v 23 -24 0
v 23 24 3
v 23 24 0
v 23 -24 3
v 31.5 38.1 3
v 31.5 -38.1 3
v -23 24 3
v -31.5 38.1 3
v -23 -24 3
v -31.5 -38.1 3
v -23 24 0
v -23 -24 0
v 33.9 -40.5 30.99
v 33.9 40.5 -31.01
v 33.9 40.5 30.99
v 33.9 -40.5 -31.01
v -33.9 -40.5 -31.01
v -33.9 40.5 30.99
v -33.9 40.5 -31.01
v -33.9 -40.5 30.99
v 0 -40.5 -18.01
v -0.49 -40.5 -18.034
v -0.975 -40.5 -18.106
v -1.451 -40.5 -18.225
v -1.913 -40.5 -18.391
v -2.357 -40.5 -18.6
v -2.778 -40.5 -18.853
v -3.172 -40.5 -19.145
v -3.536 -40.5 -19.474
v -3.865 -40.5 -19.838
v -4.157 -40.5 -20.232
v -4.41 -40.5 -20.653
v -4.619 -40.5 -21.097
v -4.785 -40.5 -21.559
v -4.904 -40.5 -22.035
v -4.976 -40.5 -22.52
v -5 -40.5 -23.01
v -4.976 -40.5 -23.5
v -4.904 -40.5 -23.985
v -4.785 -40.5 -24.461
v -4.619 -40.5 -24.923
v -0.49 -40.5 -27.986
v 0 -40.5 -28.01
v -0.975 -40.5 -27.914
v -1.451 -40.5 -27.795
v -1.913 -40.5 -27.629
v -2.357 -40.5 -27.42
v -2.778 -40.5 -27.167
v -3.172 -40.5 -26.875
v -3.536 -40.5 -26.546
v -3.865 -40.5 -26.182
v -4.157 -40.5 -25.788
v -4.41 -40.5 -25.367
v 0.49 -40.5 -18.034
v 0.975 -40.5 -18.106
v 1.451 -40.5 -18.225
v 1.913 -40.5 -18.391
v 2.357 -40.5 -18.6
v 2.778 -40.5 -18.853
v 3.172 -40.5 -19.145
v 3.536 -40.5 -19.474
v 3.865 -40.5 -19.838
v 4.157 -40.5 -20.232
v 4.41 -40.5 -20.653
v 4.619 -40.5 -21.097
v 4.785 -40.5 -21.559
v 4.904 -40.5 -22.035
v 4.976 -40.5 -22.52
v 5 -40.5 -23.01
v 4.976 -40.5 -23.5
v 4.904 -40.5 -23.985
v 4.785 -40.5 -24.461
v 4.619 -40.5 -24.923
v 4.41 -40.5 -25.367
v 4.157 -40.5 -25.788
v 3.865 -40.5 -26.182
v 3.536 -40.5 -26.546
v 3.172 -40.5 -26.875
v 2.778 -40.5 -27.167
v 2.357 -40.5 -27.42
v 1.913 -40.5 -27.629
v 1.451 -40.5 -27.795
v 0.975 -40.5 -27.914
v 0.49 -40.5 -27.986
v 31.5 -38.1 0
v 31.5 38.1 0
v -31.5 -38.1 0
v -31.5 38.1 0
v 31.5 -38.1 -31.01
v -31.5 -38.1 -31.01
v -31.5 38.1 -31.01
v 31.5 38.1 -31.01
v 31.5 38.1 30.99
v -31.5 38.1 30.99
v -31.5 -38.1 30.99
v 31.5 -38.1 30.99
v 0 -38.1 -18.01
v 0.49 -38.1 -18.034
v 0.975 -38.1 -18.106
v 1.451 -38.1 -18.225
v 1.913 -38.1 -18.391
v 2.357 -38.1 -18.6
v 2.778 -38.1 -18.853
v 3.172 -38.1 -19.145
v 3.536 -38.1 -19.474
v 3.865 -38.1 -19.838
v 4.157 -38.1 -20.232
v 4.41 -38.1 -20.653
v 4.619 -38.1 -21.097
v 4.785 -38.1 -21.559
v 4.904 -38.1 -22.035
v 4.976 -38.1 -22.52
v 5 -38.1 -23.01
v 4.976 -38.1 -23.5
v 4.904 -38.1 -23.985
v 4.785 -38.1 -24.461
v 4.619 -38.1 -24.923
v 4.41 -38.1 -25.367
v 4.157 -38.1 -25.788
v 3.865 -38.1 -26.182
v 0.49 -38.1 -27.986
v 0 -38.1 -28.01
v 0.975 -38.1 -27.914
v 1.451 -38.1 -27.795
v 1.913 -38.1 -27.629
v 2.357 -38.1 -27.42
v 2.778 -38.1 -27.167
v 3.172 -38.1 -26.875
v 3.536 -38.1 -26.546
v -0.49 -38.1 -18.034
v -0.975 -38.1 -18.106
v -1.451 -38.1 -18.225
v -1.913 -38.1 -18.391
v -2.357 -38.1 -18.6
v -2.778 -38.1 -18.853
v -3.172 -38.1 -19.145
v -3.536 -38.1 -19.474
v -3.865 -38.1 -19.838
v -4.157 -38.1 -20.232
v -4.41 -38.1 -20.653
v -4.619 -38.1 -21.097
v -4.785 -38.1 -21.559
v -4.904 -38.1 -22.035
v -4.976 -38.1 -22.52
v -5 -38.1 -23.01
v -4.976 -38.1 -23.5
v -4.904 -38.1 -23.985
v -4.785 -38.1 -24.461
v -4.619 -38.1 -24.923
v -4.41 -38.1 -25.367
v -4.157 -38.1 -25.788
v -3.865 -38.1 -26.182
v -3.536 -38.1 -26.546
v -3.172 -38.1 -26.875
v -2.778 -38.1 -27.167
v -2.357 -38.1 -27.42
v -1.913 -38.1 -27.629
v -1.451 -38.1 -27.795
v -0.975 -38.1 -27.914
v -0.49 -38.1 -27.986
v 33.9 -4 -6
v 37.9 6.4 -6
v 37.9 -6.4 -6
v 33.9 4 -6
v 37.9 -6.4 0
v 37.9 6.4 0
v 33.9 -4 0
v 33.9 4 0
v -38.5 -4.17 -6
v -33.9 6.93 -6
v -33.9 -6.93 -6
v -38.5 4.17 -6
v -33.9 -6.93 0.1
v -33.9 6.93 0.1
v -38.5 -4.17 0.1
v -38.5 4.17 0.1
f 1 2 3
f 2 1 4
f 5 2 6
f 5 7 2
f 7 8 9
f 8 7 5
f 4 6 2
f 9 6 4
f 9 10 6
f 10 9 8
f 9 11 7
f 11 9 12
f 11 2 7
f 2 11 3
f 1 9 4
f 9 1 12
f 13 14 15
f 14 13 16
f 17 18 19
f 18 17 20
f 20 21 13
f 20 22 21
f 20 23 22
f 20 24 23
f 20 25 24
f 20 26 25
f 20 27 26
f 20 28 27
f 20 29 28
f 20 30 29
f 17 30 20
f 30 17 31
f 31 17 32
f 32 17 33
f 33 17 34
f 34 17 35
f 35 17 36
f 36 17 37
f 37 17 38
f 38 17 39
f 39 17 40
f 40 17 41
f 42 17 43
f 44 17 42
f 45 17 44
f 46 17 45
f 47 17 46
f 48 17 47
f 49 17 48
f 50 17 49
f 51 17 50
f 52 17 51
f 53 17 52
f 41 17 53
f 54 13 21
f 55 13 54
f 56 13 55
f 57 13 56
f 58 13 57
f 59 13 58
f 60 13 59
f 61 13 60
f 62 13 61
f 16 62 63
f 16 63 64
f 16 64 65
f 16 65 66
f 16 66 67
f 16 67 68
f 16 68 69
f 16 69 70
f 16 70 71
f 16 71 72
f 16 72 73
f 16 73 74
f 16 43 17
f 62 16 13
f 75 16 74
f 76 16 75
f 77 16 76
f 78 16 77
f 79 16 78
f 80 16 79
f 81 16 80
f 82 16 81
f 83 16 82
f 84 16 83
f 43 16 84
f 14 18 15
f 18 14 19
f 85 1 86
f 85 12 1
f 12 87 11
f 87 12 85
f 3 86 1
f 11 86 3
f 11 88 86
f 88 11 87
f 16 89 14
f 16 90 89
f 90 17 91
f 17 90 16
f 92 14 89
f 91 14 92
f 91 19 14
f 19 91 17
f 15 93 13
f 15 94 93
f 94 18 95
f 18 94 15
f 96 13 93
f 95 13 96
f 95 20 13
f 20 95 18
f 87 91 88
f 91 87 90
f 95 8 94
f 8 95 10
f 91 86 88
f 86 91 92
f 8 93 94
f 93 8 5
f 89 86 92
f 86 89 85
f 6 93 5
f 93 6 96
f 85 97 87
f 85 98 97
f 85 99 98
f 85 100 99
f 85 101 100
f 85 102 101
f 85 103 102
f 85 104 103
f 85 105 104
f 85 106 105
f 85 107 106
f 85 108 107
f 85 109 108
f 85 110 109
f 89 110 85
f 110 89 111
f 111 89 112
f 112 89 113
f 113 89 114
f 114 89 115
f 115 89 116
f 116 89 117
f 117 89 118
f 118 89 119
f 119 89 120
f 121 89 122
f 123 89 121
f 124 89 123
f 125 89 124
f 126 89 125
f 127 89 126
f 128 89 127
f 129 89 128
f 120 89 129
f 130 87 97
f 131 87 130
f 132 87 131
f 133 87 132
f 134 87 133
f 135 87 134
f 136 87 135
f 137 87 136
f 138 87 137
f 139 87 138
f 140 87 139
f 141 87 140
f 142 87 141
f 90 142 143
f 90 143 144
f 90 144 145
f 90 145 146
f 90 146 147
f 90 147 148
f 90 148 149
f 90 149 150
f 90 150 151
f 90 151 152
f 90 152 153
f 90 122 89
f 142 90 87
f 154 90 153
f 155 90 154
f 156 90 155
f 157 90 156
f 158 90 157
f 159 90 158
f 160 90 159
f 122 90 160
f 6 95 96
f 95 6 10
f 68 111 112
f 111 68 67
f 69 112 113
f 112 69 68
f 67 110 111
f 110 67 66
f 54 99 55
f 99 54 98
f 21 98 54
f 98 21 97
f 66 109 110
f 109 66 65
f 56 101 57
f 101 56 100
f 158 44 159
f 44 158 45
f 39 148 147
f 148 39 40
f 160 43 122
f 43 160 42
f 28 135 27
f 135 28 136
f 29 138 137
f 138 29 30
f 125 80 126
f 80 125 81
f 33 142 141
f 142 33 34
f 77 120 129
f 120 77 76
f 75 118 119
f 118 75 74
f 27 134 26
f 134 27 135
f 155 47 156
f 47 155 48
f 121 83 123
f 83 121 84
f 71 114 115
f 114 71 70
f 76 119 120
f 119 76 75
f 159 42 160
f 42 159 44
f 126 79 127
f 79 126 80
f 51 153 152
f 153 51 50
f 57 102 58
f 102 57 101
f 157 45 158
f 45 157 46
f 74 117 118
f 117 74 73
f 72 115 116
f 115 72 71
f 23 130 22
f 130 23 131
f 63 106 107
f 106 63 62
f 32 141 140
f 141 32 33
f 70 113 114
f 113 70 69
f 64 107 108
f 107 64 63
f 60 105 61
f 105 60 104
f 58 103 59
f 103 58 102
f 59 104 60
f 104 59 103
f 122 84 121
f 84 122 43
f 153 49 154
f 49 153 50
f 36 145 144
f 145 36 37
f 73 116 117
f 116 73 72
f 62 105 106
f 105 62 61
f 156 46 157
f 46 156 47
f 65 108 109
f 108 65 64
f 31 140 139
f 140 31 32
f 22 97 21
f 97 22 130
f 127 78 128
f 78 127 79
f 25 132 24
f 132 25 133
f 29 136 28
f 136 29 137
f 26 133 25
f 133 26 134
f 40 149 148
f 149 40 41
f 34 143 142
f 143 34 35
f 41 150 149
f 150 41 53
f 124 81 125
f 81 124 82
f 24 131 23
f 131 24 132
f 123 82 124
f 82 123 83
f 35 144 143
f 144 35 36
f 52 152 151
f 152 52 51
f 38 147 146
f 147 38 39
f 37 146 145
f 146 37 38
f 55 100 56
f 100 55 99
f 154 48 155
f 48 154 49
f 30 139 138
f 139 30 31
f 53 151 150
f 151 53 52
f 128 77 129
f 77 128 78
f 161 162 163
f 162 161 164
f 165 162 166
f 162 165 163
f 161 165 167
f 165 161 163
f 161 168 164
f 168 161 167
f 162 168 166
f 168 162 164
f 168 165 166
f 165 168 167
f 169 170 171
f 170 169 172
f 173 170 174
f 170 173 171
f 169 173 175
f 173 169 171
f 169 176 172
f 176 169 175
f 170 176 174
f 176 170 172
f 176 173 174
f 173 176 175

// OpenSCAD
// file: params.scad
// ============================================================
// params.scad — every tunable dimension for the split-flap build.
// Units: millimetres. Import this from module.scad / enclosure.scad.
//
// The three numbers you actually tune for YOUR printer are the
// *_CLEARANCE values near the bottom. Everything else is geometry.
// ============================================================

// ---- character / flap geometry ----
FLAP_COUNT      = 48;      // flaps on the drum (matches charset.json)
FLAP_W          = 42;      // printed flap width  (visible glyph area a touch narrower)
FLAP_H          = 46;      // printed flap height (top+bottom halves together)
FLAP_T          = 0.6;     // flap material thickness (0.5mm PET / sticker card)
FLAP_PIN_D      = 1.8;     // diameter of the two side pins that ride the drum slots
FLAP_PIN_L      = 2.2;     // how far each pin sticks out per side

// ---- drum (the two slotted spools the flaps clip into) ----
// Radius is derived so FLAP_COUNT flaps sit evenly around the circle.
DRUM_SLOT_PITCH = 360 / FLAP_COUNT;          // angular pitch between flaps (deg)
DRUM_R          = (FLAP_H/2) / sin(DRUM_SLOT_PITCH/2) * 0.86; // pack radius
DRUM_WALL       = 2.0;
DRUM_SPOKES     = 6;
SHAFT_D         = 5.0;     // 5 mm steel rod through the drum
SHAFT_FLAT      = 0.5;     // D-flat depth so the drum keys to a filed shaft

// ---- module body ----
MODULE_W        = FLAP_W + 8;    // interior width (flap + side walls clearance)
MODULE_H        = 66;            // front bezel height of one unit
MODULE_D        = 62;            // depth front-to-back (drum + motor stack)
WALL            = 2.4;           // printed wall thickness of the module body

// ---- motor: 28BYJ-48 + ULN2003 ----
MOTOR_BODY_D    = 28.25;   // stepper body diameter
MOTOR_BOSS_D    = 9.2;     // centre boss around the shaft
MOTOR_SHAFT_D   = 5.0;     // 5 mm flatted output shaft (couples to drum)
MOTOR_MOUNT_W   = 35.0;    // centre-to-centre of the two M3 mount tabs
MOTOR_TAB_H     = 7.0;
MOTOR_M3_D      = 3.2;

// ---- hall sensor + home magnet ----
HALL_PCB_W      = 12.0;    // small hall-sensor breakout footprint
HALL_PCB_H      = 15.0;
MAGNET_D        = 4.0;     // 4x2 mm neodymium disc pressed into the drum hub
MAGNET_T        = 2.0;

// ---- front acrylic window (optional clean face) ----
ACRYLIC_T       = 2.0;
WINDOW_W        = FLAP_W - 2;
WINDOW_H        = FLAP_H - 4;

// ---- enclosure grid ----
ROWS            = 4;
COLS            = 16;
MODULE_PITCH_X  = MODULE_W + 2*WALL + 1.0;   // horizontal centre spacing
MODULE_PITCH_Y  = MODULE_H + 3.0;            // vertical centre spacing
BEZEL           = 6;       // black frame border around the whole array
PANEL_GAP       = 0.4;     // gap between neighbouring bezels (dual-color seam)

// ---- print tolerances (TUNE THESE for your Bambu + filament) ----
// Print hardware/openscad/fit_test.scad first and dial these in.
FIT_LOOSE       = 0.30;    // rotating / sliding fits (drum on shaft holder)
FIT_SNUG        = 0.15;    // press / clip fits (flap pins, bearing seats)
BEARING_OD      = 16.0;    // 608 bearing OD (optional, for a smoother drum)
BEARING_ID      = 8.0;
BEARING_T       = 7.0;

$fn = 64;
// main file
// ============================================================
// enclosure.scad — the black, fully-enclosed modular frame.
//
// Prints as TILES: one bezel tile per module (or per small cluster),
// so a 4x16 wall is an array of identical tiles that clip together.
// This keeps every part inside a Bambu A1/P1/X1 build volume and makes
// the design "modular" — add columns by printing more tiles.
//
// Render one tile:            enclosure_tile();
// Preview a 4x16 wall:        wall_preview();
// Dual color: the FACE is one filament (black), the ACCENT inlay a
// second (set ACCENT=true and slice with a filament change / AMS).
// ============================================================
include <params.scad>

ACCENT       = false;   // true -> render only the accent inlay body for a 2-color slice
TILE_COLS    = 1;       // modules per tile horizontally (1 = fully modular)
TILE_ROWS    = 1;       // modules per tile vertically

tile_w = TILE_COLS * MODULE_PITCH_X + 2*BEZEL;
tile_h = TILE_ROWS * MODULE_PITCH_Y + 2*BEZEL;
face_t = 3.0;           // thickness of the front bezel plate

// A single window cut-out for the flaps to show through.
module window_cut() {
    // rounded rectangle window
    r = 3;
    hull() for (sx=[-1,1], sy=[-1,1])
        translate([sx*(WINDOW_W/2 - r), sy*(WINDOW_H/2 - r), 0])
            cylinder(h = face_t*3, r = r, center=true);
}

// The recessed shelf that holds the optional acrylic sheet.
module acrylic_rebate() {
    translate([0,0, face_t - ACRYLIC_T])
        cube([WINDOW_W+6, WINDOW_H+6, ACRYLIC_T*2], center=true);
}

// Clip features so neighbouring tiles snap together (dovetail rails).
module edge_clips(w, h) {
    clip = 4;
    // right-edge male dovetail
    translate([w/2, 0, -6]) rotate([0,0,0])
        linear_extrude(6) polygon([[0,-clip],[clip,-clip*1.6],[clip,clip*1.6],[0,clip]]);
    // left-edge female pocket
    translate([-w/2 - clip - FIT_LOOSE, 0, -6])
        linear_extrude(6+0.1) offset(delta=FIT_LOOSE)
            polygon([[0,-clip],[clip,-clip*1.6],[clip,clip*1.6],[0,clip]]);
}

module bezel_face() {
    difference() {
        // front plate
        translate([0,0,0])
            linear_extrude(face_t)
                offset(r=2) offset(delta=-2)
                    square([tile_w, tile_h], center=true);
        // windows per module
        for (cx = [0:TILE_COLS-1], cy = [0:TILE_ROWS-1]) {
            x = (cx - (TILE_COLS-1)/2) * MODULE_PITCH_X;
            y = (cy - (TILE_ROWS-1)/2) * MODULE_PITCH_Y;
            translate([x, y, 0]) window_cut();
            translate([x, y, 0]) acrylic_rebate();
        }
    }
}

// A shallow accent groove around each window — printed in filament #2.
module accent_inlay() {
    for (cx = [0:TILE_COLS-1], cy = [0:TILE_ROWS-1]) {
        x = (cx - (TILE_COLS-1)/2) * MODULE_PITCH_X;
        y = (cy - (TILE_ROWS-1)/2) * MODULE_PITCH_Y;
        translate([x, y, face_t-0.6])
            linear_extrude(0.6)
                difference() {
                    offset(r=2.4) window2d();
                    offset(r=0.8) window2d();
                }
    }
}
module window2d() {
    r=3; offset(r=r) offset(delta=-r) square([WINDOW_W, WINDOW_H], center=true);
}

// Side walls that turn the bezel into a fully-enclosed box shell.
module shell_walls() {
    difference() {
        translate([0,0,-MODULE_D/2])
            linear_extrude(MODULE_D)
                difference() {
                    square([tile_w, tile_h], center=true);
                    square([tile_w-2*WALL, tile_h-2*WALL], center=true);
                }
        // cable pass-throughs on the bottom wall
        translate([0,-tile_h/2, -MODULE_D/2 + 8])
            rotate([90,0,0]) cylinder(h=WALL*3, d=10, center=true);
    }
}

module enclosure_tile() {
    if (ACCENT) {
        accent_inlay();
    } else {
        union() {
            bezel_face();
            translate([0,0,-0.01]) shell_walls();
            edge_clips(tile_w, tile_h);
        }
    }
}

module wall_preview() {
    for (cx=[0:COLS-1], cy=[0:ROWS-1])
        translate([cx*(MODULE_PITCH_X), -cy*(MODULE_PITCH_Y), 0])
            color(cy%2 ? "#111" : "#161616") enclosure_tile();
}

enclosure_tile();
